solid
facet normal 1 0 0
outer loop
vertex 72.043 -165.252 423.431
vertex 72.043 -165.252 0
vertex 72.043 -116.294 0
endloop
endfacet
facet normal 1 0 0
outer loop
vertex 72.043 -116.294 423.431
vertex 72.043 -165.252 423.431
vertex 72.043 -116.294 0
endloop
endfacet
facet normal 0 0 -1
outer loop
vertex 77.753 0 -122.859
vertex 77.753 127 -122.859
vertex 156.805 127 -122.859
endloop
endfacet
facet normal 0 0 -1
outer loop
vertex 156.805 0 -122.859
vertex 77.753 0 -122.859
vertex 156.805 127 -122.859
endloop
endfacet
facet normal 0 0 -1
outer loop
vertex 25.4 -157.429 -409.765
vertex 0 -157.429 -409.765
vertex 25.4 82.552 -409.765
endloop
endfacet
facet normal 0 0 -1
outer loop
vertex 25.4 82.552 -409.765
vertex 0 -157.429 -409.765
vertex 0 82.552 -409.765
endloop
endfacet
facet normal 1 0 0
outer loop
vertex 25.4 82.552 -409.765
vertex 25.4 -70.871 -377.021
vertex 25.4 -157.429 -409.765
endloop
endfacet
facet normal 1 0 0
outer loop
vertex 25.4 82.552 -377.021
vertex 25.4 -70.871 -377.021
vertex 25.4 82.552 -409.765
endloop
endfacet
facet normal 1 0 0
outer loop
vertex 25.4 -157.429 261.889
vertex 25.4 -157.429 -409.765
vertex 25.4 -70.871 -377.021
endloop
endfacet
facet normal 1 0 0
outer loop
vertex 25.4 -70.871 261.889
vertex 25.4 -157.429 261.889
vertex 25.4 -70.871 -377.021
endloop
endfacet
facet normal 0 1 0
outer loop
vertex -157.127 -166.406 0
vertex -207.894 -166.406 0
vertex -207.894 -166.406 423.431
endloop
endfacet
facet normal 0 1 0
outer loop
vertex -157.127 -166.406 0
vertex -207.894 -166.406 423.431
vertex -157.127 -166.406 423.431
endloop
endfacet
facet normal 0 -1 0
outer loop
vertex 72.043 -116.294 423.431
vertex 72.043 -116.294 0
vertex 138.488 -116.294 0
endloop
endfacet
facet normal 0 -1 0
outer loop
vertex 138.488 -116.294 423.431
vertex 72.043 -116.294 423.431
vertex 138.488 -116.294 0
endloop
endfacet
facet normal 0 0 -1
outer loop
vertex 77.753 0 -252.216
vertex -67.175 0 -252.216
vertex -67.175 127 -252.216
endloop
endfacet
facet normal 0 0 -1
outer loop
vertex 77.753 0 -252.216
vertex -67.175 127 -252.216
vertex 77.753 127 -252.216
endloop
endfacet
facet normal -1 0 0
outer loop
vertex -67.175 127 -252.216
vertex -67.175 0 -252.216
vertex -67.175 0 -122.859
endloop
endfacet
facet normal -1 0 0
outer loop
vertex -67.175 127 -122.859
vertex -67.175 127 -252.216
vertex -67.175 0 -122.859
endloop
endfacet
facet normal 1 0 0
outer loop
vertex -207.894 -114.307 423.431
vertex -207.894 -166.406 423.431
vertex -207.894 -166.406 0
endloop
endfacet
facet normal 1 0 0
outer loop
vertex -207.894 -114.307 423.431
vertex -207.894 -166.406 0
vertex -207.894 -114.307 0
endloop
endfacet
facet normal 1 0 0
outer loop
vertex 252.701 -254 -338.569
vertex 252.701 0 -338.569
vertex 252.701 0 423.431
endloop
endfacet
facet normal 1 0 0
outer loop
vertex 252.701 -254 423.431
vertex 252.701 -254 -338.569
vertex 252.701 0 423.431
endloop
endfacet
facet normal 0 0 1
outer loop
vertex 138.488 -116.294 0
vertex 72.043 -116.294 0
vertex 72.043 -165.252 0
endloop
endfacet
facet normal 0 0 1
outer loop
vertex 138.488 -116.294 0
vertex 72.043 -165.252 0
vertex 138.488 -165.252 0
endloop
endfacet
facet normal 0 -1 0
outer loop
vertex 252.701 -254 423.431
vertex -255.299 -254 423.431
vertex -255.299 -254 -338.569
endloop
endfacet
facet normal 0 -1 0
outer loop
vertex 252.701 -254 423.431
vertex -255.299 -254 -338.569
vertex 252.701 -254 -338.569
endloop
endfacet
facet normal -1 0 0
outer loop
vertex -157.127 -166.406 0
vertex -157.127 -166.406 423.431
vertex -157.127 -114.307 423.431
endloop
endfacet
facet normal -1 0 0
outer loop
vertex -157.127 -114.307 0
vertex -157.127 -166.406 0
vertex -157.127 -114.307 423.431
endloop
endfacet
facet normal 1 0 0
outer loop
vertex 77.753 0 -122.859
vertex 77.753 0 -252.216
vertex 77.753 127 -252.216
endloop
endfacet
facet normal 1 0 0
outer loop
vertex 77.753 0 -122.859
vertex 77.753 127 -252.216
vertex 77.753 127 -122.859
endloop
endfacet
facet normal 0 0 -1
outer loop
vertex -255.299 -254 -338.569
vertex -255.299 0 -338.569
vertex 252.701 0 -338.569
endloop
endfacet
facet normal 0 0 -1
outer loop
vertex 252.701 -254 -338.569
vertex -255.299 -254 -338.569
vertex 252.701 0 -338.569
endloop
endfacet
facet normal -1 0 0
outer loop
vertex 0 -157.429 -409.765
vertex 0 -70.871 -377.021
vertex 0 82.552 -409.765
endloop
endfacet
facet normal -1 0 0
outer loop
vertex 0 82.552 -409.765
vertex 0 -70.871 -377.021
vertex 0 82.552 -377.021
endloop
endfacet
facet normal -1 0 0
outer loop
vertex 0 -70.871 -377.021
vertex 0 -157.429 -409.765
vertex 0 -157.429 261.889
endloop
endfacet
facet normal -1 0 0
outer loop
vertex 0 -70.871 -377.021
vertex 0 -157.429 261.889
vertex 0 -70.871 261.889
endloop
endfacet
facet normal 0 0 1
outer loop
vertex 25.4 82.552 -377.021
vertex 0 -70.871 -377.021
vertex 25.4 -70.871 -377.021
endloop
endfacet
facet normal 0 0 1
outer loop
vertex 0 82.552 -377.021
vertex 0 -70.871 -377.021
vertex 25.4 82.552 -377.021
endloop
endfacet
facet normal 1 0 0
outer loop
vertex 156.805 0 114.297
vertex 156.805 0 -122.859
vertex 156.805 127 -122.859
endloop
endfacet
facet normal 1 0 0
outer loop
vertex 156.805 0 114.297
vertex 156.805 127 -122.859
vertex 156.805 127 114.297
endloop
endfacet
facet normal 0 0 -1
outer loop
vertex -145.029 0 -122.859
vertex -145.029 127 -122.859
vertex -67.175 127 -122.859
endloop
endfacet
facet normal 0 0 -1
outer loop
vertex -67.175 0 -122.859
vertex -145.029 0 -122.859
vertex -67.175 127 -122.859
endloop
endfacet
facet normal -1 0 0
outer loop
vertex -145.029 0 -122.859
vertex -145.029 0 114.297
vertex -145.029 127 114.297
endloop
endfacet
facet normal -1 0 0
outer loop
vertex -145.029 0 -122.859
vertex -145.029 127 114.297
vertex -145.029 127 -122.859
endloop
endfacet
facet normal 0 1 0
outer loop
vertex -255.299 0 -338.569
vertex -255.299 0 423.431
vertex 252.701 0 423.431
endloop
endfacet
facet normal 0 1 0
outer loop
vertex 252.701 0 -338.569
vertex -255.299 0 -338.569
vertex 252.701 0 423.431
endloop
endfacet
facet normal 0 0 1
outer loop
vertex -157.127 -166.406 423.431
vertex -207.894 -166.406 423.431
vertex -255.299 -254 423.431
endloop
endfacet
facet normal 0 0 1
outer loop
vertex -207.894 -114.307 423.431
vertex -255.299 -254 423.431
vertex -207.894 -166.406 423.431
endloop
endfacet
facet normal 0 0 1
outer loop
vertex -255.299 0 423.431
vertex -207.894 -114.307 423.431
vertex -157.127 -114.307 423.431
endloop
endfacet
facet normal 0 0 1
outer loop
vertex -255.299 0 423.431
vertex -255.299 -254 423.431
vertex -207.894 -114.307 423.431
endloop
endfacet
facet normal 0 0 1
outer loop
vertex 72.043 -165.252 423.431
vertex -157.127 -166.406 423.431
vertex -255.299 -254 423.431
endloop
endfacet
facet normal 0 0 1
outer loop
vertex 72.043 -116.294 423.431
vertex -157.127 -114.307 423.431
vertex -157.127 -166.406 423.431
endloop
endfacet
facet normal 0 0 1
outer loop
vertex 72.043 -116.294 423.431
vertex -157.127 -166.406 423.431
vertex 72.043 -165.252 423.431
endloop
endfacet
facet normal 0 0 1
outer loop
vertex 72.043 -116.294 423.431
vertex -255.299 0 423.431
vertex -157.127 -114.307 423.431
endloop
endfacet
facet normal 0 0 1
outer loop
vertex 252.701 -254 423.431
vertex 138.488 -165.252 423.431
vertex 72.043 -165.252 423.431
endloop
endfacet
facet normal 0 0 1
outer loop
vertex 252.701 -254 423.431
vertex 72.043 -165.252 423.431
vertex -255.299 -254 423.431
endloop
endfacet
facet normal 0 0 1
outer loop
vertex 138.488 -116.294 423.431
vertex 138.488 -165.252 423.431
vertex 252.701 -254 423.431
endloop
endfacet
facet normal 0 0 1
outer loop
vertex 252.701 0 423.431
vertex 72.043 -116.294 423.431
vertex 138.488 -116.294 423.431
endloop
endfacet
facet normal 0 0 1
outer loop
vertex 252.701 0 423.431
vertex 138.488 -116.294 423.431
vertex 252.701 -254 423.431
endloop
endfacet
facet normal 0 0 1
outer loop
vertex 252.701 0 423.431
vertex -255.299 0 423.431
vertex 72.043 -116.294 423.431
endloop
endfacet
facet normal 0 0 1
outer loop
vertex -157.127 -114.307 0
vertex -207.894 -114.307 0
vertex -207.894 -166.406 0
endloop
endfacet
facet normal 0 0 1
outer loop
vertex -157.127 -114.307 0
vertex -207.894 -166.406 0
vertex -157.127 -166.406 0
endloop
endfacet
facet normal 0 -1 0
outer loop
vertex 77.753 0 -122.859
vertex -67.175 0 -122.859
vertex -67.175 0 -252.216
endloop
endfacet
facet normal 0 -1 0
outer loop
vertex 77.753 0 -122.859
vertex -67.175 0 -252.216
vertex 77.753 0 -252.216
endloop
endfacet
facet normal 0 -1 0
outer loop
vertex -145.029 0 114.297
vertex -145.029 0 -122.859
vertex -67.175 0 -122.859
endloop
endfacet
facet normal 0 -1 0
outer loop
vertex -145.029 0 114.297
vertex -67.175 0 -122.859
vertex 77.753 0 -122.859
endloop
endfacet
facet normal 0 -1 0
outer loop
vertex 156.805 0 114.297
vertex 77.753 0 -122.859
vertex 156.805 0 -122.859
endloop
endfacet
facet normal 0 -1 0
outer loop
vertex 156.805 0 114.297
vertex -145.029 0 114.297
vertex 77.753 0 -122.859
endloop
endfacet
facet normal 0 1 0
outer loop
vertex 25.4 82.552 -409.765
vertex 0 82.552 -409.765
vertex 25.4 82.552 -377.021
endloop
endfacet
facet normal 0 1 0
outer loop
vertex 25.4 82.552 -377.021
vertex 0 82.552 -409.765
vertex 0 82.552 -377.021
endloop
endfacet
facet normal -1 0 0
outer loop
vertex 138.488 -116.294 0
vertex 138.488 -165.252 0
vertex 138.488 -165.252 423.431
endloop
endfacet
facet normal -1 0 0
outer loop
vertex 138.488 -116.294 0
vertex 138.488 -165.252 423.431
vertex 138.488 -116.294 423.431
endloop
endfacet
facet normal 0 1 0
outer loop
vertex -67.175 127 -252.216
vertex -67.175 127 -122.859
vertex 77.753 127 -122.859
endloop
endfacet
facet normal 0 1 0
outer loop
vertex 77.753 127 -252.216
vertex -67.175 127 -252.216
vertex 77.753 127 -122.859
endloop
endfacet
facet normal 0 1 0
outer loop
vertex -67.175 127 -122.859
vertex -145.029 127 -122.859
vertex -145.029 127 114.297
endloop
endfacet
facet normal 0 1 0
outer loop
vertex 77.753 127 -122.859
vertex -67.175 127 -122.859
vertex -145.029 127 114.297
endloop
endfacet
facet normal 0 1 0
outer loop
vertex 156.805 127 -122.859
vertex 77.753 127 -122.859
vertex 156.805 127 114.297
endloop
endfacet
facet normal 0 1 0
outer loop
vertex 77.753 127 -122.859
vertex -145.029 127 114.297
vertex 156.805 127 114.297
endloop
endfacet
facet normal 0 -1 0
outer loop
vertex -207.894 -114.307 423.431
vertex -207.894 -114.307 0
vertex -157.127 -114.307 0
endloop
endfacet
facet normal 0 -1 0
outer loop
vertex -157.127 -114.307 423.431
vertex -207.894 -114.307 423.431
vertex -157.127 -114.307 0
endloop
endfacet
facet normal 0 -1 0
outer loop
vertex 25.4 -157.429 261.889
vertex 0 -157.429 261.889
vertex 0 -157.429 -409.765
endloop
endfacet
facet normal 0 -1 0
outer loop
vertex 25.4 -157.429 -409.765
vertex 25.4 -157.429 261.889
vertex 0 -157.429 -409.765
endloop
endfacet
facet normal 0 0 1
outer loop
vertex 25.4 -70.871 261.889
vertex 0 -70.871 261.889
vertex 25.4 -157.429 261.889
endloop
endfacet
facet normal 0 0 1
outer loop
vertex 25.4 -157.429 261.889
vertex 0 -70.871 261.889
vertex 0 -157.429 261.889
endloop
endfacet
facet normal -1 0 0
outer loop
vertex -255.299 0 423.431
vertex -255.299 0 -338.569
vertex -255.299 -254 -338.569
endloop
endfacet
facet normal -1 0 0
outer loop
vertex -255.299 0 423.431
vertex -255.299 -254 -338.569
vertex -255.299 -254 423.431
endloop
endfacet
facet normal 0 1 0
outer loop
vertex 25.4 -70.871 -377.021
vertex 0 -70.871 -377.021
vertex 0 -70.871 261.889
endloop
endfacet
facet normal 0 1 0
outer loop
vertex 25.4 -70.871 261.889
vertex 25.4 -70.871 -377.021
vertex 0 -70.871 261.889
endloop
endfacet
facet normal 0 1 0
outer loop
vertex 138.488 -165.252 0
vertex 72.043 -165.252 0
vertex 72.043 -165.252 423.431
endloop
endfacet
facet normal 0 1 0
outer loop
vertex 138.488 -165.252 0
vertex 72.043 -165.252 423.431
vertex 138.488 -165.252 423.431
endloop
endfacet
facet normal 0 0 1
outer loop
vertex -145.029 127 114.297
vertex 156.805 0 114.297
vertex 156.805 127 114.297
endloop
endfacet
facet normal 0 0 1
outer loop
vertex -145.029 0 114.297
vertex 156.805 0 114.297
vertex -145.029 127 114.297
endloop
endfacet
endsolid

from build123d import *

# Parameters (mm, degrees)
F0_W     = 508
F0_H     = 762
F1_DEPTH = 254
F2_W     = 144.9282839894
F2_H     = 129.3575018644
F3_DEPTH = 127
F4_W     = 153.4224897623
F4_H     = 32.7441394329
F5_DEPTH = 25.4
F6_W     = 50.7672429085
F6_H     = 52.0987808704
F6_W_2   = 66.4442628622
F6_H_2   = 48.9581227303
F7_DEPTH = 508


with BuildPart() as f1:
    # F0 (on Front) → F1 (new body)
    with BuildSketch(Plane.XZ):
        with Locations((-1.2987554073, 42.4313310723)):
            Rectangle(F0_W, F0_H)
    extrude(amount=F1_DEPTH)

    # F6 (on Top) → F7 (cut)
    with BuildSketch(Plane.XY):
        with Locations((-182.5101822615, -140.3568685055)):
            Rectangle(F6_W, F6_H)
        with Locations((105.2653864026, -140.7729238272)):
            Rectangle(F6_W_2, F6_H_2)
    extrude(amount=F7_DEPTH, mode=Mode.SUBTRACT)


with BuildPart() as f3:
    # F2 (on Front) → F3 (new body)
    with BuildSketch(Plane.XZ):
        Polygon((156.8048298359, -122.8587776423), (156.8048298359, 114.2966076732), (-145.0293064117, 114.2966076732), (-145.0293064117, -122.8587776423), (-67.1752467752, -122.8587776423), (77.7530372143, -122.8587776423), align=None)
        with Locations((5.2888952196, -187.5375285745)):
            Rectangle(F2_W, F2_H)
    extrude(amount=-F3_DEPTH)


with BuildPart() as f5:
    # F4 (on Right) → F5 (new body)
    with BuildSketch(Plane.YZ):
        Polygon((-70.8707123995, -377.0208656788), (-70.8707123995, 261.8890404701), (-157.4290394783, 261.8890404701), (-157.4290394783, -409.7650051117), (-70.8707123995, -409.7650051117), align=None)
        with Locations((5.8405324817, -393.3929353952)):
            Rectangle(F4_W, F4_H)
    extrude(amount=F5_DEPTH)


solid = Compound([f1.part, f3.part, f5.part])
